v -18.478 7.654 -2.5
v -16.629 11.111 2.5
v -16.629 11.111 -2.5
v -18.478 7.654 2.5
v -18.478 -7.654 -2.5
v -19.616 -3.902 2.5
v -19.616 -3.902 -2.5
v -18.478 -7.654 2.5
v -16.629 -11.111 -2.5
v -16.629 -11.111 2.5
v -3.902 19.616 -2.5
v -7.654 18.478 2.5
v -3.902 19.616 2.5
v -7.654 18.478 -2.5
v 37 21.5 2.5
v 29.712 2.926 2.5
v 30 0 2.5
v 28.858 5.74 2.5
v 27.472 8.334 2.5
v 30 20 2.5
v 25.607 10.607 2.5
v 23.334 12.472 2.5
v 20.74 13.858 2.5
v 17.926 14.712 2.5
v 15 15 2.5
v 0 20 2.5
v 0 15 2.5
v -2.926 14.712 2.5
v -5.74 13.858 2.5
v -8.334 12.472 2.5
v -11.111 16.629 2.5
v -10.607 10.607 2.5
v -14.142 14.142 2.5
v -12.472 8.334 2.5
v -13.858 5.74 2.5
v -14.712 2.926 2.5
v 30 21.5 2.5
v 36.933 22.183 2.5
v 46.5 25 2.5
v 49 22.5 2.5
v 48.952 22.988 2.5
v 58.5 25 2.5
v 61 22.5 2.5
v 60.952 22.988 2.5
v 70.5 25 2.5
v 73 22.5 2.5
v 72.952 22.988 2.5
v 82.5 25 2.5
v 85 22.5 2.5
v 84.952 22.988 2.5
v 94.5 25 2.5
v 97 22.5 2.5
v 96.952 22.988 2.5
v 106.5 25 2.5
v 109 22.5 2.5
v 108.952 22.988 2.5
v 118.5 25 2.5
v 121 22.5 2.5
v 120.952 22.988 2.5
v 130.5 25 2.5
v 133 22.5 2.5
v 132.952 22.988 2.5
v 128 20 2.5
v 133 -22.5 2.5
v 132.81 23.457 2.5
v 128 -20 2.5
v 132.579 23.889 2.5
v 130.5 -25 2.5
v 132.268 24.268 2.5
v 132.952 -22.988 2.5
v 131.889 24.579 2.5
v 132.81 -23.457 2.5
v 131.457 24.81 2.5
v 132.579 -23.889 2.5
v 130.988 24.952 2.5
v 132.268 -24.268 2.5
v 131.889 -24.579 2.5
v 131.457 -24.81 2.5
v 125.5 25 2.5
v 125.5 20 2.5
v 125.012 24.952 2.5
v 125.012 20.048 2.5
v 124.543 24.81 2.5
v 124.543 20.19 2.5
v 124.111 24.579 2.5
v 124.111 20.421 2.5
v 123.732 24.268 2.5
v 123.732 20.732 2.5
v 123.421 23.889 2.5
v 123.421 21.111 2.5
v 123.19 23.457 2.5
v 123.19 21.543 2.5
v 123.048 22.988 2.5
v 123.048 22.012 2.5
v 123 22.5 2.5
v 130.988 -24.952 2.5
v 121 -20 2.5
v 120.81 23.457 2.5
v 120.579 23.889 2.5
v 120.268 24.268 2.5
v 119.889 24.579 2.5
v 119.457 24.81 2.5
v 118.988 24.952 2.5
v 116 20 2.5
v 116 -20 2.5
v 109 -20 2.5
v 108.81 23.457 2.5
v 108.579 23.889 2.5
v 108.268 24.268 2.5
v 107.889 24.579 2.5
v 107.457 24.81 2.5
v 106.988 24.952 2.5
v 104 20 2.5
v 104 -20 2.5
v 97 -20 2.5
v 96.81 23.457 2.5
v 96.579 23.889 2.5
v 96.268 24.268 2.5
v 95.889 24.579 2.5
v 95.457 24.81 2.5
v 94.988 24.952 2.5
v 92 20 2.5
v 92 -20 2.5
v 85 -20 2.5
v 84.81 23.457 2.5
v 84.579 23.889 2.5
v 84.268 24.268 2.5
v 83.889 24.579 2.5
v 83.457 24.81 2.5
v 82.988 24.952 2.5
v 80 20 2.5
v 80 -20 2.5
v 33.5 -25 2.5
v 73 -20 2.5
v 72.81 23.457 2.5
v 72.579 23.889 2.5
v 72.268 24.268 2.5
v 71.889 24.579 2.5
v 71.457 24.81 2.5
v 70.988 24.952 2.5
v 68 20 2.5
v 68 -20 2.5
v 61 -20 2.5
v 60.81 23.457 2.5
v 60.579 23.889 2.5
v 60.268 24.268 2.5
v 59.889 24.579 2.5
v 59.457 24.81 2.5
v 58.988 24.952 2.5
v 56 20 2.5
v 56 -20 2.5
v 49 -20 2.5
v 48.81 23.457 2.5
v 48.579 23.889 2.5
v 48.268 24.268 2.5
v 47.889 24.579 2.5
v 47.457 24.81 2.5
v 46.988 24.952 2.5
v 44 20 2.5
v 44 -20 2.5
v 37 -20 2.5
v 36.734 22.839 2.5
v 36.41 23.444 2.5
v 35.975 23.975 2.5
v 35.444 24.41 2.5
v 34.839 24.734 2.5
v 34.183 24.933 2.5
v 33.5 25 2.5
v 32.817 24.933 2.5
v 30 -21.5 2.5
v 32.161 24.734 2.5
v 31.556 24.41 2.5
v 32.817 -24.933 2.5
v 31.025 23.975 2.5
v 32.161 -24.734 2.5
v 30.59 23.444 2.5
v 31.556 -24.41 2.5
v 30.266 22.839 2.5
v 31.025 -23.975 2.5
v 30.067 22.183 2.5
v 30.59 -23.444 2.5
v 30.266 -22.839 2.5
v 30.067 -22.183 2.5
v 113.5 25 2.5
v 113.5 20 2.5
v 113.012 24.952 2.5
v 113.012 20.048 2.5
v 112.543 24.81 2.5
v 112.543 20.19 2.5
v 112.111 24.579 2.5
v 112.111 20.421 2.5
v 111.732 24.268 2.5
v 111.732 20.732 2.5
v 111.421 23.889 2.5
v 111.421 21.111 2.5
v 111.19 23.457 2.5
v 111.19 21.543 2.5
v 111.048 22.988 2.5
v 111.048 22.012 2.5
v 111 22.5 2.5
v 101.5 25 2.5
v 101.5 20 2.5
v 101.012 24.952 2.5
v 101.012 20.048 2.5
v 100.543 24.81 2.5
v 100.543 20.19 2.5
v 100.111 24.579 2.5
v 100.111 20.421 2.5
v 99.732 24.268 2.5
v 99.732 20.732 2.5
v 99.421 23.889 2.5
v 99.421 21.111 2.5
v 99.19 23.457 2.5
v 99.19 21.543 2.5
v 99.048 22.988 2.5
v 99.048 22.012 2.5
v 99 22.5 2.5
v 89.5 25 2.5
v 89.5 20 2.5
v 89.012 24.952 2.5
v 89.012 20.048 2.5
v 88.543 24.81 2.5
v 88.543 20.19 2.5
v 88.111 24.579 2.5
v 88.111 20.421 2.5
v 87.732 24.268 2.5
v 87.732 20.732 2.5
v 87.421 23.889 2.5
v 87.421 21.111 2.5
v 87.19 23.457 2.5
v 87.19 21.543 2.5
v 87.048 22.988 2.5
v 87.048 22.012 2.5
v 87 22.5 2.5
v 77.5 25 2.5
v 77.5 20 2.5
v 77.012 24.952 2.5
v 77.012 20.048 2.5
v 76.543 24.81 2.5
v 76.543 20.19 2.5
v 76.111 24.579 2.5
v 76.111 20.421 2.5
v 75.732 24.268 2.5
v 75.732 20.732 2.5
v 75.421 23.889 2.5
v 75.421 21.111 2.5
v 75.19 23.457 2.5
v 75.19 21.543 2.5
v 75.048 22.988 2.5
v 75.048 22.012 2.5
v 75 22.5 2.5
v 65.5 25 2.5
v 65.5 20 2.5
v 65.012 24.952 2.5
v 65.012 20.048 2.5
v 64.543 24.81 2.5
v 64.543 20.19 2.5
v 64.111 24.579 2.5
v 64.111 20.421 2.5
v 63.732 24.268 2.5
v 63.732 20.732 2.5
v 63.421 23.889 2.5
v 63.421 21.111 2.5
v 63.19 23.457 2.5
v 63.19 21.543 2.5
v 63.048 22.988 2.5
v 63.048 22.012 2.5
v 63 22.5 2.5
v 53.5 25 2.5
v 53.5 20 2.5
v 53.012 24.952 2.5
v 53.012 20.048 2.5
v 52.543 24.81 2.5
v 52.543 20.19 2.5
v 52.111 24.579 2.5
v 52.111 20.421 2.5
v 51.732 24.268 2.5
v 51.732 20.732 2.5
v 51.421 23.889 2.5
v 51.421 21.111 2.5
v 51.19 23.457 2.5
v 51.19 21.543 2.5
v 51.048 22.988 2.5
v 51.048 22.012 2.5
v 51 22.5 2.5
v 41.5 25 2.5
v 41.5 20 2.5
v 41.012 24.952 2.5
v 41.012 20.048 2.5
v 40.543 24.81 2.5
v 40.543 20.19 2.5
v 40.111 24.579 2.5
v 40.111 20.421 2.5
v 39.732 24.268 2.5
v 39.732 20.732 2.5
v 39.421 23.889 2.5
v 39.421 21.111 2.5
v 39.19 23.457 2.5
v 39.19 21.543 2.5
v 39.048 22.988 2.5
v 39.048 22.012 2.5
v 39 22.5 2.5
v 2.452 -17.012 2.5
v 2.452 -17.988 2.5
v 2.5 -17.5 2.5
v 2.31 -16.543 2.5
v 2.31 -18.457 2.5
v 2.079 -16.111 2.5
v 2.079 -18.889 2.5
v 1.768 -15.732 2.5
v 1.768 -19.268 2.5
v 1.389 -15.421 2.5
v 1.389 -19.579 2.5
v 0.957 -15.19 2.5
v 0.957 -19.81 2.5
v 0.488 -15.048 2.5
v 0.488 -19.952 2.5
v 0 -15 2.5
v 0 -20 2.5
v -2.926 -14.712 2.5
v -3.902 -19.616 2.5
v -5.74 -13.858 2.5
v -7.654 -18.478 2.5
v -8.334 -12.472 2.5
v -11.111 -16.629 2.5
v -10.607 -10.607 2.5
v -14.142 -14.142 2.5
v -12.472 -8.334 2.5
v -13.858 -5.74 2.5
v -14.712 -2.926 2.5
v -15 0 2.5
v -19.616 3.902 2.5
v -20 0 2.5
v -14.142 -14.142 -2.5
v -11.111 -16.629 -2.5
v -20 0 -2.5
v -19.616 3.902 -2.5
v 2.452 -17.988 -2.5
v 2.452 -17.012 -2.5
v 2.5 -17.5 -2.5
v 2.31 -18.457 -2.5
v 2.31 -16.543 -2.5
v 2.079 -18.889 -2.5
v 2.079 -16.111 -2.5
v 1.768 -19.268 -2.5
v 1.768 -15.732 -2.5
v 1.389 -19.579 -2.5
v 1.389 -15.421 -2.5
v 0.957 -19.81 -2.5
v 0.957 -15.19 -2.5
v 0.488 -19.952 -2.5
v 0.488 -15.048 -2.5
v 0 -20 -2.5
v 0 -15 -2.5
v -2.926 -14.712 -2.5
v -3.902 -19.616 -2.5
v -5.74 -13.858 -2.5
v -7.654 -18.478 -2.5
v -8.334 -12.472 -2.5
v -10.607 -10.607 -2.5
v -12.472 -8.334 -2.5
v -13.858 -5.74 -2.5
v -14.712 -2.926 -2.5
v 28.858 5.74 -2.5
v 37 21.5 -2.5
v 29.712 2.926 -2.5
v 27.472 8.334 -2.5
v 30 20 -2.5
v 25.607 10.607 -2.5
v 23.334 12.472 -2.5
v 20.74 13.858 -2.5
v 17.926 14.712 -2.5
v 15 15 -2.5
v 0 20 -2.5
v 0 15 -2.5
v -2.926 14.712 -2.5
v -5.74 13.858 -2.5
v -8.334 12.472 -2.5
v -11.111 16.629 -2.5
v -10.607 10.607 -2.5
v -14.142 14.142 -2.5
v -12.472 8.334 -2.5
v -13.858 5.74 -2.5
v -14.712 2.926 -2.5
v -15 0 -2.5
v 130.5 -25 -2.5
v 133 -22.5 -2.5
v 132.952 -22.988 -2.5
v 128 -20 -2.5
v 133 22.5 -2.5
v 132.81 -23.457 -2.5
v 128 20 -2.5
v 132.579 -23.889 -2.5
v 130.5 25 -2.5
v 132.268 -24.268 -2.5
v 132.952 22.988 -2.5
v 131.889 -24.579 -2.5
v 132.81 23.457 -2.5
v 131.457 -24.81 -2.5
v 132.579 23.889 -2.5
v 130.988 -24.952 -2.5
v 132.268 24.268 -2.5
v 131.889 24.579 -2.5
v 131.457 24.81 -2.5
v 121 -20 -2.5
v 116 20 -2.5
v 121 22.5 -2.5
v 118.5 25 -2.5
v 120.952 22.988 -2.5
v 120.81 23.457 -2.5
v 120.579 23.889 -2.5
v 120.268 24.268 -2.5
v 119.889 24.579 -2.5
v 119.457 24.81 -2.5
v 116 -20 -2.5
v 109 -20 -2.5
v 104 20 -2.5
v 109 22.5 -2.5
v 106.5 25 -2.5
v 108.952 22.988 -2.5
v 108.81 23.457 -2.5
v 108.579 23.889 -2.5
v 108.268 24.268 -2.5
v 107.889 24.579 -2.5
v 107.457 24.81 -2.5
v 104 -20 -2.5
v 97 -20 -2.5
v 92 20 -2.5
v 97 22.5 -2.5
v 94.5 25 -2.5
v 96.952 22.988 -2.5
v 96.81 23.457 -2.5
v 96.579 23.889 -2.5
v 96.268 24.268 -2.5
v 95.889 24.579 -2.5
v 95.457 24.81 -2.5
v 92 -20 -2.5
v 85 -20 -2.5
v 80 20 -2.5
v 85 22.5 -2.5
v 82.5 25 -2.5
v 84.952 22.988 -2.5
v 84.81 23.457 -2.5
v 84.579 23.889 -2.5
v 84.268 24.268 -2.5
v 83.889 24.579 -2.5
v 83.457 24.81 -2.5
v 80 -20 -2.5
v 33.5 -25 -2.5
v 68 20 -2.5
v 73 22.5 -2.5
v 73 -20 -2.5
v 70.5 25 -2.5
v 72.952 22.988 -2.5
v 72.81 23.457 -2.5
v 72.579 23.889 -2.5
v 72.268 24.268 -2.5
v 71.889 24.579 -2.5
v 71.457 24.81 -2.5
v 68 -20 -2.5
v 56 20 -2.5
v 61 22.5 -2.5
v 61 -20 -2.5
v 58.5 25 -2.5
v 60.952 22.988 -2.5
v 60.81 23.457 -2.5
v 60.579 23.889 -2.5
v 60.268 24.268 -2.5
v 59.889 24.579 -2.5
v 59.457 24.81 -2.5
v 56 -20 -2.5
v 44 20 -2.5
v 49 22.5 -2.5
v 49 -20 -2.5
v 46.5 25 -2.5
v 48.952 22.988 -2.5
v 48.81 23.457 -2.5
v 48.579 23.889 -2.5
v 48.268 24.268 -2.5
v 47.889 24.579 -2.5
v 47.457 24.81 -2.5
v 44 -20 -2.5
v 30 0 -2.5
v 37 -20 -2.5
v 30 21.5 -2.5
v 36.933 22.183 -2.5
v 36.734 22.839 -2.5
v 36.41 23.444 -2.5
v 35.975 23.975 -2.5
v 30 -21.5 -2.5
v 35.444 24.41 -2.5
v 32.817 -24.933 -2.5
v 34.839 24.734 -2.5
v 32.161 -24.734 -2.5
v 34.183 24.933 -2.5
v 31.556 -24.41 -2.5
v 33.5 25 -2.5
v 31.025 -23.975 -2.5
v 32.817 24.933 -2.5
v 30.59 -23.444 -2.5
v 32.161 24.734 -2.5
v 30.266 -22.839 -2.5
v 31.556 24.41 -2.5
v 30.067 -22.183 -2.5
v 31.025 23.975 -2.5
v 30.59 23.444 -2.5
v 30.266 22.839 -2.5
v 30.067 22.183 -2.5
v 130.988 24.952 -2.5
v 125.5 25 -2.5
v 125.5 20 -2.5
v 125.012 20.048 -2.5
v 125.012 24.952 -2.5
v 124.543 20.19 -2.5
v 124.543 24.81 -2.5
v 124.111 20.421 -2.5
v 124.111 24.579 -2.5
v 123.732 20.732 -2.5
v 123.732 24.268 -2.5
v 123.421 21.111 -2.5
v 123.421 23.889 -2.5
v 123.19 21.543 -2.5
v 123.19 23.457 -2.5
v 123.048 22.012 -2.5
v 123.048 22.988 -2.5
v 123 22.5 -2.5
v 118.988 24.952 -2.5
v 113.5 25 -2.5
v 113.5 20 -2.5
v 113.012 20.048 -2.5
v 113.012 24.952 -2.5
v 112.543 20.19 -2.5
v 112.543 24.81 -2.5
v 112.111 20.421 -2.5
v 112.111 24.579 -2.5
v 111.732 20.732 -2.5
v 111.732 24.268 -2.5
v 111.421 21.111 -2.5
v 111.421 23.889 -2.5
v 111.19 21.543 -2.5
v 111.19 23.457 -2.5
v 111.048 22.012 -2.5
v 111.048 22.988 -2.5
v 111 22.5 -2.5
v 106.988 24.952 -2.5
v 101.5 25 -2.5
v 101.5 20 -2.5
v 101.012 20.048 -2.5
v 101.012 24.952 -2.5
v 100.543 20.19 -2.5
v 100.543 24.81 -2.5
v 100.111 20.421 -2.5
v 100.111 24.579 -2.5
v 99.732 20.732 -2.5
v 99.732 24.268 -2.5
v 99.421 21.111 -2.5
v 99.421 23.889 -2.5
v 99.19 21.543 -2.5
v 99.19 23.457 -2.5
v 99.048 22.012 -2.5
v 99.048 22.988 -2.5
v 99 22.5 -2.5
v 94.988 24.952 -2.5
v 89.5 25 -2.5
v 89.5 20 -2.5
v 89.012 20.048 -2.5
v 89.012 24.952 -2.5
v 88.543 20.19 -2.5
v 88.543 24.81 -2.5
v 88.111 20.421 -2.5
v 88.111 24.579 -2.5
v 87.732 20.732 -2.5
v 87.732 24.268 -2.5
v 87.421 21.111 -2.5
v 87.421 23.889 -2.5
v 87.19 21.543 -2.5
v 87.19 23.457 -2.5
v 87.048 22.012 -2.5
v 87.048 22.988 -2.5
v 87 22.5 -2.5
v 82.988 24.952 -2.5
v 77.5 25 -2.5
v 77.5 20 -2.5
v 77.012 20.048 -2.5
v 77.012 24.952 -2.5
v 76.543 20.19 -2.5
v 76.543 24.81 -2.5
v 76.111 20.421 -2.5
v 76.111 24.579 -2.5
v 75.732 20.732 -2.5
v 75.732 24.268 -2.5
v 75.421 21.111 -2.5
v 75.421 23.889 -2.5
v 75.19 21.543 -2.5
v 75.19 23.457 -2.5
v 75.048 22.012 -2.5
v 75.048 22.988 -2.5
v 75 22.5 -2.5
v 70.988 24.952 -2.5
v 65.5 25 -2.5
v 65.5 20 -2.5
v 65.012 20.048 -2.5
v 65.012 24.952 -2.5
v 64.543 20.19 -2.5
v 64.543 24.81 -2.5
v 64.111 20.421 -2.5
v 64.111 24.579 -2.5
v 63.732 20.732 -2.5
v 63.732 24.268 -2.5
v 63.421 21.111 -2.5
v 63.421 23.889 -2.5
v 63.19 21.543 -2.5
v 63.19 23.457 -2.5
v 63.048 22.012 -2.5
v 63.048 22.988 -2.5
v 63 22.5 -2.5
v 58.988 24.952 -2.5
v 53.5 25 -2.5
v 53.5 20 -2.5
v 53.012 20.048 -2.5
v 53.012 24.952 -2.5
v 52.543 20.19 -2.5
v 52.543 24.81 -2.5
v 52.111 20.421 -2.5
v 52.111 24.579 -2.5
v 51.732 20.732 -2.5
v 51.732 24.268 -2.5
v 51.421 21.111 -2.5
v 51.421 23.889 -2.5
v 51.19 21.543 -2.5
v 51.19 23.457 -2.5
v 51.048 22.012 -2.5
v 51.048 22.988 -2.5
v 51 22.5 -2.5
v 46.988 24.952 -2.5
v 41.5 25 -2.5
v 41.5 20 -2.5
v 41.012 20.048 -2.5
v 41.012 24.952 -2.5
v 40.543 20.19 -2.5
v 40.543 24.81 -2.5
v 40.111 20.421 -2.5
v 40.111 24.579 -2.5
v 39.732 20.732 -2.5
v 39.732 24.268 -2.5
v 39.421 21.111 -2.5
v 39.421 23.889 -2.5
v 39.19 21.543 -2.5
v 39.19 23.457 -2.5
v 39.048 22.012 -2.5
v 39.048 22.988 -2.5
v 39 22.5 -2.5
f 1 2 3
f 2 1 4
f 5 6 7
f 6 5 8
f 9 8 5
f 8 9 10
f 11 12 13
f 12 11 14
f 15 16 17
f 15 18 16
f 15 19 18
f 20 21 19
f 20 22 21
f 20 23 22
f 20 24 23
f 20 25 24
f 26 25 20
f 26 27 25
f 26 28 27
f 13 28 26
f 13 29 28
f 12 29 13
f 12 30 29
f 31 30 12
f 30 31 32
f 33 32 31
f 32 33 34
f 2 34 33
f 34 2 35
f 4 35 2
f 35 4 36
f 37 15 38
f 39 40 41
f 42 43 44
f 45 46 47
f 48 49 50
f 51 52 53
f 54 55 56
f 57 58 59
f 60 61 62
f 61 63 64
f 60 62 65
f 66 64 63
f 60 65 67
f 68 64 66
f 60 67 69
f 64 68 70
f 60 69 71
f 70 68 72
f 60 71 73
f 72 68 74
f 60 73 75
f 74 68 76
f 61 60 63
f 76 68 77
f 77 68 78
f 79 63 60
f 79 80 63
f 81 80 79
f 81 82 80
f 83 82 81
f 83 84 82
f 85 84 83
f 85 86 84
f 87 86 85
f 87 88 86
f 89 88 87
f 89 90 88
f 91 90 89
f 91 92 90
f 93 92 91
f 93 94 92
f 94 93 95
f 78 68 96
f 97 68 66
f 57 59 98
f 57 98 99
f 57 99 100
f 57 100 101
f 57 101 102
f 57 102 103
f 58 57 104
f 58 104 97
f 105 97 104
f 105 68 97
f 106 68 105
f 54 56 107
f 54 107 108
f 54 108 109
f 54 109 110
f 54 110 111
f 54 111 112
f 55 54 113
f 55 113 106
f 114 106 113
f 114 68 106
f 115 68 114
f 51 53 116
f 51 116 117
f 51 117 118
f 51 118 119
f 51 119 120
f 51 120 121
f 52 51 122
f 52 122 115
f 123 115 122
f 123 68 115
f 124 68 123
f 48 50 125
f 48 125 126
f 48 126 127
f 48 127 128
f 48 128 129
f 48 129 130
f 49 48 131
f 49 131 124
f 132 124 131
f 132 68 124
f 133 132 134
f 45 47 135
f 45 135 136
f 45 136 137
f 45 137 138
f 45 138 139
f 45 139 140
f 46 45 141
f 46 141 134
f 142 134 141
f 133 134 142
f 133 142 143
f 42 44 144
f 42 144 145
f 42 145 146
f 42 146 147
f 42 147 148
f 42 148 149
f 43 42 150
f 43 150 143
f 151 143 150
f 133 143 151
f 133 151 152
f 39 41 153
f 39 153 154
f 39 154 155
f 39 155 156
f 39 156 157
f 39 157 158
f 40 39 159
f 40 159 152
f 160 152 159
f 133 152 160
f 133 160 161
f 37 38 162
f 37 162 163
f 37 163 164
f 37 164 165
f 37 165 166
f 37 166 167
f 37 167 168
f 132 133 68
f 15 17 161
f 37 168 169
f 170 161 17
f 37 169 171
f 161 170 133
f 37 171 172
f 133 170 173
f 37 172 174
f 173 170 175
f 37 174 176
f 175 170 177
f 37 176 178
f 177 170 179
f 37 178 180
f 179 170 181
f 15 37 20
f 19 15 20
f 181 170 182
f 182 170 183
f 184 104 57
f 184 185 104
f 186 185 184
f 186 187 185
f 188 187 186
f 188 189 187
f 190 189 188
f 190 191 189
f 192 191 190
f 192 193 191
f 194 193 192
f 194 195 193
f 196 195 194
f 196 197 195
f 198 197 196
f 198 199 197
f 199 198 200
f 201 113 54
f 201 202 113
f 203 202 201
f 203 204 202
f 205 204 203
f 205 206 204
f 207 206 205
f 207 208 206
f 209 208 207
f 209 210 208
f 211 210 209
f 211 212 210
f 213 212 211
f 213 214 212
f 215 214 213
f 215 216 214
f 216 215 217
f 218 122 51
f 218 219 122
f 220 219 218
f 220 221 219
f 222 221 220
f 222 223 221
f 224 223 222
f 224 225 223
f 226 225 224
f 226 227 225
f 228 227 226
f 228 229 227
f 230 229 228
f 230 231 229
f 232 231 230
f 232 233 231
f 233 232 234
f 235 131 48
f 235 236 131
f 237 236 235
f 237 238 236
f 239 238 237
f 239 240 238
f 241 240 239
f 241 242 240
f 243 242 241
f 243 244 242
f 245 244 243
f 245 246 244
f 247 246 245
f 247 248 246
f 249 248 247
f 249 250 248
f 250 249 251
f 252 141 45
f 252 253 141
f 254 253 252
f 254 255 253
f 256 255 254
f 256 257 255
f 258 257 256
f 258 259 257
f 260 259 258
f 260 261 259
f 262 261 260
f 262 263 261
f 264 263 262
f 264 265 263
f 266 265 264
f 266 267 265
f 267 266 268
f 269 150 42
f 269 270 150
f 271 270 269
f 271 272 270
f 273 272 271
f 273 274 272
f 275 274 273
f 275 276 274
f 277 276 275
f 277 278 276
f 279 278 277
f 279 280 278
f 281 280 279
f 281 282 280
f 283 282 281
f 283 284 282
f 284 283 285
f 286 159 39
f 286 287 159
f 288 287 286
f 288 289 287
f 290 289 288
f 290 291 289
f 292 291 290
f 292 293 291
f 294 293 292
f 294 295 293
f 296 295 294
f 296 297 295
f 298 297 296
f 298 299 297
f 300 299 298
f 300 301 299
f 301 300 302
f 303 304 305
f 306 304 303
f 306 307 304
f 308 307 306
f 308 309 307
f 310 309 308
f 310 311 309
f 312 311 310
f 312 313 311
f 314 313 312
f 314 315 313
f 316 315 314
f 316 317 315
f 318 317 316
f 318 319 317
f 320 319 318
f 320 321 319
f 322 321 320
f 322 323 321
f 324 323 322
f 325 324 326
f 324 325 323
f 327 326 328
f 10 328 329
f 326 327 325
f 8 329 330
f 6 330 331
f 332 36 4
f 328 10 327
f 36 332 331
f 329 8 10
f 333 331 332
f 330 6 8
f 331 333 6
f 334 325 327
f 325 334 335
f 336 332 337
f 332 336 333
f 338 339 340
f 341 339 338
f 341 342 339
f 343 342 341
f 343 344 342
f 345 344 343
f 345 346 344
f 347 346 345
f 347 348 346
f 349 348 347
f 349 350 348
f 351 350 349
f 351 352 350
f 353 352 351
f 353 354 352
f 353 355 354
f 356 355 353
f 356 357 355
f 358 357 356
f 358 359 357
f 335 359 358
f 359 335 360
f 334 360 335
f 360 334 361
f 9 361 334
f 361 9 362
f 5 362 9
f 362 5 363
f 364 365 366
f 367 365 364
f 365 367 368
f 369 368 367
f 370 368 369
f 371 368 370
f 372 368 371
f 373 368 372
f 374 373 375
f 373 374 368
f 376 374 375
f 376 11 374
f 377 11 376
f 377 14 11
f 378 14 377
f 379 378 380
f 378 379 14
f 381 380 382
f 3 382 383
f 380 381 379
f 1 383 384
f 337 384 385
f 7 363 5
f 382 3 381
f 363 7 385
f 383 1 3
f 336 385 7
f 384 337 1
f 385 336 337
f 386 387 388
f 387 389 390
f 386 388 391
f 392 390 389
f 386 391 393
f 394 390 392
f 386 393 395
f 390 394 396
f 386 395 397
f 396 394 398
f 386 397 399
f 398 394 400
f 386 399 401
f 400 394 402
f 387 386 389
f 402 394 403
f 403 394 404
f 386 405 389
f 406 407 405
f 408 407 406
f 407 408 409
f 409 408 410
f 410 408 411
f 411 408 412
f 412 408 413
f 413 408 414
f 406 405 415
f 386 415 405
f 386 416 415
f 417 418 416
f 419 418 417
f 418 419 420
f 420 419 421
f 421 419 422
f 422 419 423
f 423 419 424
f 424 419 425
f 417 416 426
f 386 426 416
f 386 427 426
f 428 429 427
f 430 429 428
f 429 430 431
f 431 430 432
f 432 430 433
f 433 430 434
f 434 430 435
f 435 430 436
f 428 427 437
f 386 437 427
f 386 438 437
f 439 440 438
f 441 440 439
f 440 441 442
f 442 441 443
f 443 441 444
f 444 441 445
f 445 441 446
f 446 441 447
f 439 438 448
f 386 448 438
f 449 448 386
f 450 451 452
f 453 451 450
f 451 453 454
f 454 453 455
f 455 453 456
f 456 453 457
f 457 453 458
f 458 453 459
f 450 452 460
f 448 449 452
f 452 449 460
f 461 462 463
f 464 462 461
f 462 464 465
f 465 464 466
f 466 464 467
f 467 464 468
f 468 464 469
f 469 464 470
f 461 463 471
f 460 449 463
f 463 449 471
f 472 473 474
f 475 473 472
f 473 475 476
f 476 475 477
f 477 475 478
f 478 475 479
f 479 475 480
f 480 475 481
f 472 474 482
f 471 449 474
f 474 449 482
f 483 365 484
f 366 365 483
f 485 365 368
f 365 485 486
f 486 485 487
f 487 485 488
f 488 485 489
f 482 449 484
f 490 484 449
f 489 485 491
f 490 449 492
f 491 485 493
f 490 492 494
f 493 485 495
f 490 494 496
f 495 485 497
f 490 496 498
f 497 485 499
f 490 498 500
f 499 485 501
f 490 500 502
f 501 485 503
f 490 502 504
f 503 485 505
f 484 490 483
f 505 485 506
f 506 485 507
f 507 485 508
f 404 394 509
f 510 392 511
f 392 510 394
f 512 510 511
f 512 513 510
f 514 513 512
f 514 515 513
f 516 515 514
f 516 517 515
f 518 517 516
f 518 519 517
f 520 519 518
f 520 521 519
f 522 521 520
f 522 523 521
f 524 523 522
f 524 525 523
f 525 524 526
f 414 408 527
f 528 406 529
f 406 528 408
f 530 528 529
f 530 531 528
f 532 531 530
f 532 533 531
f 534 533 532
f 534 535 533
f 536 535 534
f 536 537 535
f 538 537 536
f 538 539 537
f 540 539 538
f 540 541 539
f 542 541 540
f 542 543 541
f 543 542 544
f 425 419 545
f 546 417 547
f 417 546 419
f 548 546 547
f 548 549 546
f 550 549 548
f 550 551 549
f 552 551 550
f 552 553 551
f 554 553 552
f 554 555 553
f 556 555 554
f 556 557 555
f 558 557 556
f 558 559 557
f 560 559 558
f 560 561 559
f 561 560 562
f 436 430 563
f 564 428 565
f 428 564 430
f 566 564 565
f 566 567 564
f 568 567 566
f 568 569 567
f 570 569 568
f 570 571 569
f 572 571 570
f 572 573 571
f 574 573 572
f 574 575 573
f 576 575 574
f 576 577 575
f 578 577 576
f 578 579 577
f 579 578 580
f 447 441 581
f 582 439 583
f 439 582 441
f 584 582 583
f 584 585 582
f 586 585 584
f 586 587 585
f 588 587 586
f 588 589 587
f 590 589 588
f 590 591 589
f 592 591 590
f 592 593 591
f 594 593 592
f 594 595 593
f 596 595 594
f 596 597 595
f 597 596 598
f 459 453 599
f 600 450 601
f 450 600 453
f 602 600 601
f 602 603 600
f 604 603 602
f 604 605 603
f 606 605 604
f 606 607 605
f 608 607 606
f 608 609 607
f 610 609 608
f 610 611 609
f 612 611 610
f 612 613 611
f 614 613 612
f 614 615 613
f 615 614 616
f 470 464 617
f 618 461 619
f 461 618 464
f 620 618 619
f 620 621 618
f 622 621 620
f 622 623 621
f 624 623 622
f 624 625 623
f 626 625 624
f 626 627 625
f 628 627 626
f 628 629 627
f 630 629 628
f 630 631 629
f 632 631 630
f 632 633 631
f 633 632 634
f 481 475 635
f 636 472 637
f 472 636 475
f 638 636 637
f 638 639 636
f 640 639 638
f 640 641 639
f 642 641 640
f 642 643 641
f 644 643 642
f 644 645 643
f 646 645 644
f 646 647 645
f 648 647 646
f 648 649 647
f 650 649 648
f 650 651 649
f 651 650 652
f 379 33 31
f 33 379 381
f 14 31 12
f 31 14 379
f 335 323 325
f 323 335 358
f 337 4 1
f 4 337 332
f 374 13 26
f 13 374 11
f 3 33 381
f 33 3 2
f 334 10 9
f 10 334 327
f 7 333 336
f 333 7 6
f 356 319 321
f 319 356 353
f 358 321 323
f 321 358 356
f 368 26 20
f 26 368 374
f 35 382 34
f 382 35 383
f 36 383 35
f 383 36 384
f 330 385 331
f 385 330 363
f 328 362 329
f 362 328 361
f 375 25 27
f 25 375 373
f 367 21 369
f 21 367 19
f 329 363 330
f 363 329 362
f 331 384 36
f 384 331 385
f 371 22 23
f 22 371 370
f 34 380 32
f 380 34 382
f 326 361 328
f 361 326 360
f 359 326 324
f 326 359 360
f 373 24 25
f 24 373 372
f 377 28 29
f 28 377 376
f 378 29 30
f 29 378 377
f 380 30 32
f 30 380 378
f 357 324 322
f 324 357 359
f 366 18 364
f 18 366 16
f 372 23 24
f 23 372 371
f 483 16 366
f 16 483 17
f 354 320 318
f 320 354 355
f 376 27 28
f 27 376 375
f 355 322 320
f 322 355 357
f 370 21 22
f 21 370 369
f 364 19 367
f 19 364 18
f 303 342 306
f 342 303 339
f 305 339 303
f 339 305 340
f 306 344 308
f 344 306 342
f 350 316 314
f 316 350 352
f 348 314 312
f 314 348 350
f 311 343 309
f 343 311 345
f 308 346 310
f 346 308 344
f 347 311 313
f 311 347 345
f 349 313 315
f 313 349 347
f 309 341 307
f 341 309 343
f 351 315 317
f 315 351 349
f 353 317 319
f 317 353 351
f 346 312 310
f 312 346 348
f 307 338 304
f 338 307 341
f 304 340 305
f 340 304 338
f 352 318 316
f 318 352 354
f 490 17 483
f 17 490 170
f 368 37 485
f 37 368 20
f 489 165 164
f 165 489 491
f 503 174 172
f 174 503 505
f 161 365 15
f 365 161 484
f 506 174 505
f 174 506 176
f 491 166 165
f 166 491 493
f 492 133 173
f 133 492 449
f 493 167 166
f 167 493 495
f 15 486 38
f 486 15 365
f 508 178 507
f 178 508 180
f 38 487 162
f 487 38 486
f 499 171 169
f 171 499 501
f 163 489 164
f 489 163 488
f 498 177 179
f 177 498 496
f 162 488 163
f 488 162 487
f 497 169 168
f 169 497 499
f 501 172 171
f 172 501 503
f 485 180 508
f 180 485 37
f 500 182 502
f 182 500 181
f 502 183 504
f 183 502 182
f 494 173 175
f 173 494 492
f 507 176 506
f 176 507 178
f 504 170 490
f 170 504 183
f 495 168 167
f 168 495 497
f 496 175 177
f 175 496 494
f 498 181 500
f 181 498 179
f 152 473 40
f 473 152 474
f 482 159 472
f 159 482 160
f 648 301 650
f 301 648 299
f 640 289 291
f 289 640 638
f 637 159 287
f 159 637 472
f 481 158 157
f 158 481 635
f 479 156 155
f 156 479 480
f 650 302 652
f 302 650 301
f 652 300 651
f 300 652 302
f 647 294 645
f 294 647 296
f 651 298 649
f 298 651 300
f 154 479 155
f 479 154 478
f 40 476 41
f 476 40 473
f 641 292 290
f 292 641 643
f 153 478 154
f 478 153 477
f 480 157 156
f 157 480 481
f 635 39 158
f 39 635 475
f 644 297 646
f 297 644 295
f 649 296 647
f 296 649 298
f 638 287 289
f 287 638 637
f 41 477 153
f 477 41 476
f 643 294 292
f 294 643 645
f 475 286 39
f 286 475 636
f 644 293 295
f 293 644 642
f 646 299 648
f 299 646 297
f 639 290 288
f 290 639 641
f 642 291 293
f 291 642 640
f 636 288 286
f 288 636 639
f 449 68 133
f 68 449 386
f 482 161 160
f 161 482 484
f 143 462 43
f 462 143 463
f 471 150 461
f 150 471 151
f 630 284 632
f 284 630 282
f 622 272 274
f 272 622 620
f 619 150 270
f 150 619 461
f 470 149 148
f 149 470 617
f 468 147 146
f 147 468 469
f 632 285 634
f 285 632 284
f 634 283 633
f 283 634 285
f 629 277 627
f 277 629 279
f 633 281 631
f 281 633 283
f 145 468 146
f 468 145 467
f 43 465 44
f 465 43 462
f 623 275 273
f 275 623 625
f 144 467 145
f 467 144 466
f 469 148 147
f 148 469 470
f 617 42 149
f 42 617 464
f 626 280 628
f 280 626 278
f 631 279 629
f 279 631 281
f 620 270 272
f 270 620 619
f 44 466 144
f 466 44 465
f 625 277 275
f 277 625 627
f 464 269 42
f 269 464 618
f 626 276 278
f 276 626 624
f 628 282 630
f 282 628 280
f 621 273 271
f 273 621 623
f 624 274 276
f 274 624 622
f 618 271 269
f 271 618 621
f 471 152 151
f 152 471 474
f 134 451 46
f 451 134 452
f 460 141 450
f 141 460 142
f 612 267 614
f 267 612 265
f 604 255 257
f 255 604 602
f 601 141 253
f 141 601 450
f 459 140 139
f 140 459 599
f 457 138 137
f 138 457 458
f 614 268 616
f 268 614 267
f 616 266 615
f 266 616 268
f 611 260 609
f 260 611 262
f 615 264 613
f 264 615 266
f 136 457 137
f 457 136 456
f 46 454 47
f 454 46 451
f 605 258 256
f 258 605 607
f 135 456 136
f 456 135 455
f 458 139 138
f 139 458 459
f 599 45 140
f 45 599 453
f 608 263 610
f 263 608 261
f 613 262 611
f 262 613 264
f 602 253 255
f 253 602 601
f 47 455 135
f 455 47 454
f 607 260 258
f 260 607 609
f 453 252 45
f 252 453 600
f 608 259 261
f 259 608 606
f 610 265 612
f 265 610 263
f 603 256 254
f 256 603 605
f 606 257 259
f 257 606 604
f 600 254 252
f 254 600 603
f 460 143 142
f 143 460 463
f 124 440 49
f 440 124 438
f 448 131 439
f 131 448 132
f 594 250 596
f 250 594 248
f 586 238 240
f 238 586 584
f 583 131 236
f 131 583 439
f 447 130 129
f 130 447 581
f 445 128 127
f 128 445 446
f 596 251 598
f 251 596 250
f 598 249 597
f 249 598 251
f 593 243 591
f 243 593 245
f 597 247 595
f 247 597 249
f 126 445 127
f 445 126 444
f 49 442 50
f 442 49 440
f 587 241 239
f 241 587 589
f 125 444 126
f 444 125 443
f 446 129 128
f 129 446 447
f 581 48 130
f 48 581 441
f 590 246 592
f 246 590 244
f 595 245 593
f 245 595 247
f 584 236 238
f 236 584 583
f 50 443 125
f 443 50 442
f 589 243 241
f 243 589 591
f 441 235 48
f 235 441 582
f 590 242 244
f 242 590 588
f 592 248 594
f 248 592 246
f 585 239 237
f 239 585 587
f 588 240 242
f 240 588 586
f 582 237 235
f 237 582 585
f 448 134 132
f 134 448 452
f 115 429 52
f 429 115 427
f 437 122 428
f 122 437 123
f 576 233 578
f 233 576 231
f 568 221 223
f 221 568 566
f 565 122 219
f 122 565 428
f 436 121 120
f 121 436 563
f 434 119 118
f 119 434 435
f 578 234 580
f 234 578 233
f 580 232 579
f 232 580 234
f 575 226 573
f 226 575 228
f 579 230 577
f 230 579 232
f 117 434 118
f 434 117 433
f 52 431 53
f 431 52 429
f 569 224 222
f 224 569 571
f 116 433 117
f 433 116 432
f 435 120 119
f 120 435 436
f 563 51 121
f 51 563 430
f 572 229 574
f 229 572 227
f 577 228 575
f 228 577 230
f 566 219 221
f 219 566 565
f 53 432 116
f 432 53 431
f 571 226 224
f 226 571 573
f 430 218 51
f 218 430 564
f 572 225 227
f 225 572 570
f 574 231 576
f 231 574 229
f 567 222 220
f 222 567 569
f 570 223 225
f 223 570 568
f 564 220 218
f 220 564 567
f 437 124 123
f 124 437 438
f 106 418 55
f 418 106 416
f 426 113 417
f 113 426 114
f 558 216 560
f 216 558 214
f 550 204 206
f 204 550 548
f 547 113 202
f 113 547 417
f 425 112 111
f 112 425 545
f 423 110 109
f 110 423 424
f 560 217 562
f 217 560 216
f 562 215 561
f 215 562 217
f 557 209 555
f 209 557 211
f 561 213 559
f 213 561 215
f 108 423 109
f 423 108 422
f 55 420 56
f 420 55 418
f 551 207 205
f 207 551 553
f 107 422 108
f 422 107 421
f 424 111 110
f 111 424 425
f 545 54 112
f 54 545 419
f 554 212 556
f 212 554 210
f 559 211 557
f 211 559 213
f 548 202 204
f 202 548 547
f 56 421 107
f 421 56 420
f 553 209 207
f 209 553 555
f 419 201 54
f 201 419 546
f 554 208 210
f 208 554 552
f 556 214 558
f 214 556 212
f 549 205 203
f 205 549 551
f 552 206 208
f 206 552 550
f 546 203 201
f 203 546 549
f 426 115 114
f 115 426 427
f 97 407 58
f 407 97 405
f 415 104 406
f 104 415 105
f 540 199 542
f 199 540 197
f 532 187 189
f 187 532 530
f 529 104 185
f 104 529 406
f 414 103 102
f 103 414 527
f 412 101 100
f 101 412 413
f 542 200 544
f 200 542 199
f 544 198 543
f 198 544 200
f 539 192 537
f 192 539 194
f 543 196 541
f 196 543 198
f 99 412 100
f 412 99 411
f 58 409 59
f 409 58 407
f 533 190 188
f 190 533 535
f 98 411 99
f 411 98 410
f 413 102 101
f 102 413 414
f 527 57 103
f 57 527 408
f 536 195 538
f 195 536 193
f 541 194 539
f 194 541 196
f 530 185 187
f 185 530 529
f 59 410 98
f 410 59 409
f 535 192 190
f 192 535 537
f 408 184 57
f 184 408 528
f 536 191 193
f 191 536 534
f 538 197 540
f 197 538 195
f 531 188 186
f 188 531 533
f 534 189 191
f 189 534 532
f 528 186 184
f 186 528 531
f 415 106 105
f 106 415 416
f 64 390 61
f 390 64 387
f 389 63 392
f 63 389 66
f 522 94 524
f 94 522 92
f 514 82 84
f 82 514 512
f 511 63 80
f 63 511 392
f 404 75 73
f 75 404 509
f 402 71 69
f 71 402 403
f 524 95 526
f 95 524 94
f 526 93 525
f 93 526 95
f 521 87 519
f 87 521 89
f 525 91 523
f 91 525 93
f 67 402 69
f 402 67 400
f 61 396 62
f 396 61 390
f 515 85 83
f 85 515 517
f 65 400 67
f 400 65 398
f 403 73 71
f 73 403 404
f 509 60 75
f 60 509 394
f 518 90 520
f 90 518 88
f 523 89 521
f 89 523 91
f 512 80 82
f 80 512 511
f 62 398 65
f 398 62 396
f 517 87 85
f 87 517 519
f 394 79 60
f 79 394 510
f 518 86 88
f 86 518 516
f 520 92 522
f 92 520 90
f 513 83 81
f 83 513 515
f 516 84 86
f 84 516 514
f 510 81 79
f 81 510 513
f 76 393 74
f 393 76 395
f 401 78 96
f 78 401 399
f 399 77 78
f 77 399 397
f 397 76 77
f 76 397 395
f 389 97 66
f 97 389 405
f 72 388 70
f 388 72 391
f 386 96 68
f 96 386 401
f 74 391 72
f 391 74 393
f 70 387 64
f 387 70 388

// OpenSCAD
tiecount=8; // [1:50]
ringdiameter=30; // [20:80]
thickness=5; // [2, 3, 4, 5]

$fn=32;
union(){
    union() {
		//HOOK
        difference() {
            union() {
                cylinder(d=ringdiameter+10,h=thickness, center=true);
                translate([0,0,-thickness/2]) cube([ringdiameter+3.5,ringdiameter/2+5,thickness]);
            }
            union() {
                hull() {
                 cylinder(d=ringdiameter,h=thickness+2, center=true);
                 translate([ringdiameter/2,0,0]) cylinder(d=ringdiameter,h=thickness+2, center=true);   
                }
                translate([ringdiameter/2,-ringdiameter/2,0]) cube([ringdiameter,ringdiameter,thickness+2], center=true);
            }
        }
        
		//HOOK_END_ROUND
        translate([0,-ringdiameter/2-2.5,0]) cylinder(d=5,h=thickness, center=true);
        
		//SHOULDER
        translate([ringdiameter+3.5,0,0]) 
		if(ringdiameter>45){
			hull(){
				translate([0,-max(45,ringdiameter+3)/2,0]) cylinder(d=7,h=thickness,center=true);
				translate([0,max(45,ringdiameter+3)/2,0]) cylinder(d=7,h=thickness,center=true);
			}
		}
		else{
			hull(){
				translate([0,-max(45,ringdiameter+3)/2+1,0]) cylinder(d=7,h=thickness,center=true);
				translate([0,max(45,ringdiameter+3)/2-1,0]) cylinder(d=7,h=thickness,center=true);
			}	
		}
    }
	//TIE_SLOTS
    for(i = [1:tiecount]) {
		translate([i*12+ringdiameter+4.5,0,0]) union() {
			cube([5,max(45,ringdiameter+5),thickness], center=true);
			hull(){
				translate([0,max(45,ringdiameter+5)/2,0]) cylinder(d=5,h=thickness,center=true);
				translate([-5,max(45,ringdiameter+5)/2,0]) cylinder(d=5,h=thickness,center=true);
			}
			hull(){
				translate([0,-max(45,ringdiameter+5)/2,0]) cylinder(d=5,h=thickness,center=true);
				translate([-13,-max(45,ringdiameter+5)/2,0]) cylinder(d=5,h=thickness,center=true);
			}
		}
	}
}
